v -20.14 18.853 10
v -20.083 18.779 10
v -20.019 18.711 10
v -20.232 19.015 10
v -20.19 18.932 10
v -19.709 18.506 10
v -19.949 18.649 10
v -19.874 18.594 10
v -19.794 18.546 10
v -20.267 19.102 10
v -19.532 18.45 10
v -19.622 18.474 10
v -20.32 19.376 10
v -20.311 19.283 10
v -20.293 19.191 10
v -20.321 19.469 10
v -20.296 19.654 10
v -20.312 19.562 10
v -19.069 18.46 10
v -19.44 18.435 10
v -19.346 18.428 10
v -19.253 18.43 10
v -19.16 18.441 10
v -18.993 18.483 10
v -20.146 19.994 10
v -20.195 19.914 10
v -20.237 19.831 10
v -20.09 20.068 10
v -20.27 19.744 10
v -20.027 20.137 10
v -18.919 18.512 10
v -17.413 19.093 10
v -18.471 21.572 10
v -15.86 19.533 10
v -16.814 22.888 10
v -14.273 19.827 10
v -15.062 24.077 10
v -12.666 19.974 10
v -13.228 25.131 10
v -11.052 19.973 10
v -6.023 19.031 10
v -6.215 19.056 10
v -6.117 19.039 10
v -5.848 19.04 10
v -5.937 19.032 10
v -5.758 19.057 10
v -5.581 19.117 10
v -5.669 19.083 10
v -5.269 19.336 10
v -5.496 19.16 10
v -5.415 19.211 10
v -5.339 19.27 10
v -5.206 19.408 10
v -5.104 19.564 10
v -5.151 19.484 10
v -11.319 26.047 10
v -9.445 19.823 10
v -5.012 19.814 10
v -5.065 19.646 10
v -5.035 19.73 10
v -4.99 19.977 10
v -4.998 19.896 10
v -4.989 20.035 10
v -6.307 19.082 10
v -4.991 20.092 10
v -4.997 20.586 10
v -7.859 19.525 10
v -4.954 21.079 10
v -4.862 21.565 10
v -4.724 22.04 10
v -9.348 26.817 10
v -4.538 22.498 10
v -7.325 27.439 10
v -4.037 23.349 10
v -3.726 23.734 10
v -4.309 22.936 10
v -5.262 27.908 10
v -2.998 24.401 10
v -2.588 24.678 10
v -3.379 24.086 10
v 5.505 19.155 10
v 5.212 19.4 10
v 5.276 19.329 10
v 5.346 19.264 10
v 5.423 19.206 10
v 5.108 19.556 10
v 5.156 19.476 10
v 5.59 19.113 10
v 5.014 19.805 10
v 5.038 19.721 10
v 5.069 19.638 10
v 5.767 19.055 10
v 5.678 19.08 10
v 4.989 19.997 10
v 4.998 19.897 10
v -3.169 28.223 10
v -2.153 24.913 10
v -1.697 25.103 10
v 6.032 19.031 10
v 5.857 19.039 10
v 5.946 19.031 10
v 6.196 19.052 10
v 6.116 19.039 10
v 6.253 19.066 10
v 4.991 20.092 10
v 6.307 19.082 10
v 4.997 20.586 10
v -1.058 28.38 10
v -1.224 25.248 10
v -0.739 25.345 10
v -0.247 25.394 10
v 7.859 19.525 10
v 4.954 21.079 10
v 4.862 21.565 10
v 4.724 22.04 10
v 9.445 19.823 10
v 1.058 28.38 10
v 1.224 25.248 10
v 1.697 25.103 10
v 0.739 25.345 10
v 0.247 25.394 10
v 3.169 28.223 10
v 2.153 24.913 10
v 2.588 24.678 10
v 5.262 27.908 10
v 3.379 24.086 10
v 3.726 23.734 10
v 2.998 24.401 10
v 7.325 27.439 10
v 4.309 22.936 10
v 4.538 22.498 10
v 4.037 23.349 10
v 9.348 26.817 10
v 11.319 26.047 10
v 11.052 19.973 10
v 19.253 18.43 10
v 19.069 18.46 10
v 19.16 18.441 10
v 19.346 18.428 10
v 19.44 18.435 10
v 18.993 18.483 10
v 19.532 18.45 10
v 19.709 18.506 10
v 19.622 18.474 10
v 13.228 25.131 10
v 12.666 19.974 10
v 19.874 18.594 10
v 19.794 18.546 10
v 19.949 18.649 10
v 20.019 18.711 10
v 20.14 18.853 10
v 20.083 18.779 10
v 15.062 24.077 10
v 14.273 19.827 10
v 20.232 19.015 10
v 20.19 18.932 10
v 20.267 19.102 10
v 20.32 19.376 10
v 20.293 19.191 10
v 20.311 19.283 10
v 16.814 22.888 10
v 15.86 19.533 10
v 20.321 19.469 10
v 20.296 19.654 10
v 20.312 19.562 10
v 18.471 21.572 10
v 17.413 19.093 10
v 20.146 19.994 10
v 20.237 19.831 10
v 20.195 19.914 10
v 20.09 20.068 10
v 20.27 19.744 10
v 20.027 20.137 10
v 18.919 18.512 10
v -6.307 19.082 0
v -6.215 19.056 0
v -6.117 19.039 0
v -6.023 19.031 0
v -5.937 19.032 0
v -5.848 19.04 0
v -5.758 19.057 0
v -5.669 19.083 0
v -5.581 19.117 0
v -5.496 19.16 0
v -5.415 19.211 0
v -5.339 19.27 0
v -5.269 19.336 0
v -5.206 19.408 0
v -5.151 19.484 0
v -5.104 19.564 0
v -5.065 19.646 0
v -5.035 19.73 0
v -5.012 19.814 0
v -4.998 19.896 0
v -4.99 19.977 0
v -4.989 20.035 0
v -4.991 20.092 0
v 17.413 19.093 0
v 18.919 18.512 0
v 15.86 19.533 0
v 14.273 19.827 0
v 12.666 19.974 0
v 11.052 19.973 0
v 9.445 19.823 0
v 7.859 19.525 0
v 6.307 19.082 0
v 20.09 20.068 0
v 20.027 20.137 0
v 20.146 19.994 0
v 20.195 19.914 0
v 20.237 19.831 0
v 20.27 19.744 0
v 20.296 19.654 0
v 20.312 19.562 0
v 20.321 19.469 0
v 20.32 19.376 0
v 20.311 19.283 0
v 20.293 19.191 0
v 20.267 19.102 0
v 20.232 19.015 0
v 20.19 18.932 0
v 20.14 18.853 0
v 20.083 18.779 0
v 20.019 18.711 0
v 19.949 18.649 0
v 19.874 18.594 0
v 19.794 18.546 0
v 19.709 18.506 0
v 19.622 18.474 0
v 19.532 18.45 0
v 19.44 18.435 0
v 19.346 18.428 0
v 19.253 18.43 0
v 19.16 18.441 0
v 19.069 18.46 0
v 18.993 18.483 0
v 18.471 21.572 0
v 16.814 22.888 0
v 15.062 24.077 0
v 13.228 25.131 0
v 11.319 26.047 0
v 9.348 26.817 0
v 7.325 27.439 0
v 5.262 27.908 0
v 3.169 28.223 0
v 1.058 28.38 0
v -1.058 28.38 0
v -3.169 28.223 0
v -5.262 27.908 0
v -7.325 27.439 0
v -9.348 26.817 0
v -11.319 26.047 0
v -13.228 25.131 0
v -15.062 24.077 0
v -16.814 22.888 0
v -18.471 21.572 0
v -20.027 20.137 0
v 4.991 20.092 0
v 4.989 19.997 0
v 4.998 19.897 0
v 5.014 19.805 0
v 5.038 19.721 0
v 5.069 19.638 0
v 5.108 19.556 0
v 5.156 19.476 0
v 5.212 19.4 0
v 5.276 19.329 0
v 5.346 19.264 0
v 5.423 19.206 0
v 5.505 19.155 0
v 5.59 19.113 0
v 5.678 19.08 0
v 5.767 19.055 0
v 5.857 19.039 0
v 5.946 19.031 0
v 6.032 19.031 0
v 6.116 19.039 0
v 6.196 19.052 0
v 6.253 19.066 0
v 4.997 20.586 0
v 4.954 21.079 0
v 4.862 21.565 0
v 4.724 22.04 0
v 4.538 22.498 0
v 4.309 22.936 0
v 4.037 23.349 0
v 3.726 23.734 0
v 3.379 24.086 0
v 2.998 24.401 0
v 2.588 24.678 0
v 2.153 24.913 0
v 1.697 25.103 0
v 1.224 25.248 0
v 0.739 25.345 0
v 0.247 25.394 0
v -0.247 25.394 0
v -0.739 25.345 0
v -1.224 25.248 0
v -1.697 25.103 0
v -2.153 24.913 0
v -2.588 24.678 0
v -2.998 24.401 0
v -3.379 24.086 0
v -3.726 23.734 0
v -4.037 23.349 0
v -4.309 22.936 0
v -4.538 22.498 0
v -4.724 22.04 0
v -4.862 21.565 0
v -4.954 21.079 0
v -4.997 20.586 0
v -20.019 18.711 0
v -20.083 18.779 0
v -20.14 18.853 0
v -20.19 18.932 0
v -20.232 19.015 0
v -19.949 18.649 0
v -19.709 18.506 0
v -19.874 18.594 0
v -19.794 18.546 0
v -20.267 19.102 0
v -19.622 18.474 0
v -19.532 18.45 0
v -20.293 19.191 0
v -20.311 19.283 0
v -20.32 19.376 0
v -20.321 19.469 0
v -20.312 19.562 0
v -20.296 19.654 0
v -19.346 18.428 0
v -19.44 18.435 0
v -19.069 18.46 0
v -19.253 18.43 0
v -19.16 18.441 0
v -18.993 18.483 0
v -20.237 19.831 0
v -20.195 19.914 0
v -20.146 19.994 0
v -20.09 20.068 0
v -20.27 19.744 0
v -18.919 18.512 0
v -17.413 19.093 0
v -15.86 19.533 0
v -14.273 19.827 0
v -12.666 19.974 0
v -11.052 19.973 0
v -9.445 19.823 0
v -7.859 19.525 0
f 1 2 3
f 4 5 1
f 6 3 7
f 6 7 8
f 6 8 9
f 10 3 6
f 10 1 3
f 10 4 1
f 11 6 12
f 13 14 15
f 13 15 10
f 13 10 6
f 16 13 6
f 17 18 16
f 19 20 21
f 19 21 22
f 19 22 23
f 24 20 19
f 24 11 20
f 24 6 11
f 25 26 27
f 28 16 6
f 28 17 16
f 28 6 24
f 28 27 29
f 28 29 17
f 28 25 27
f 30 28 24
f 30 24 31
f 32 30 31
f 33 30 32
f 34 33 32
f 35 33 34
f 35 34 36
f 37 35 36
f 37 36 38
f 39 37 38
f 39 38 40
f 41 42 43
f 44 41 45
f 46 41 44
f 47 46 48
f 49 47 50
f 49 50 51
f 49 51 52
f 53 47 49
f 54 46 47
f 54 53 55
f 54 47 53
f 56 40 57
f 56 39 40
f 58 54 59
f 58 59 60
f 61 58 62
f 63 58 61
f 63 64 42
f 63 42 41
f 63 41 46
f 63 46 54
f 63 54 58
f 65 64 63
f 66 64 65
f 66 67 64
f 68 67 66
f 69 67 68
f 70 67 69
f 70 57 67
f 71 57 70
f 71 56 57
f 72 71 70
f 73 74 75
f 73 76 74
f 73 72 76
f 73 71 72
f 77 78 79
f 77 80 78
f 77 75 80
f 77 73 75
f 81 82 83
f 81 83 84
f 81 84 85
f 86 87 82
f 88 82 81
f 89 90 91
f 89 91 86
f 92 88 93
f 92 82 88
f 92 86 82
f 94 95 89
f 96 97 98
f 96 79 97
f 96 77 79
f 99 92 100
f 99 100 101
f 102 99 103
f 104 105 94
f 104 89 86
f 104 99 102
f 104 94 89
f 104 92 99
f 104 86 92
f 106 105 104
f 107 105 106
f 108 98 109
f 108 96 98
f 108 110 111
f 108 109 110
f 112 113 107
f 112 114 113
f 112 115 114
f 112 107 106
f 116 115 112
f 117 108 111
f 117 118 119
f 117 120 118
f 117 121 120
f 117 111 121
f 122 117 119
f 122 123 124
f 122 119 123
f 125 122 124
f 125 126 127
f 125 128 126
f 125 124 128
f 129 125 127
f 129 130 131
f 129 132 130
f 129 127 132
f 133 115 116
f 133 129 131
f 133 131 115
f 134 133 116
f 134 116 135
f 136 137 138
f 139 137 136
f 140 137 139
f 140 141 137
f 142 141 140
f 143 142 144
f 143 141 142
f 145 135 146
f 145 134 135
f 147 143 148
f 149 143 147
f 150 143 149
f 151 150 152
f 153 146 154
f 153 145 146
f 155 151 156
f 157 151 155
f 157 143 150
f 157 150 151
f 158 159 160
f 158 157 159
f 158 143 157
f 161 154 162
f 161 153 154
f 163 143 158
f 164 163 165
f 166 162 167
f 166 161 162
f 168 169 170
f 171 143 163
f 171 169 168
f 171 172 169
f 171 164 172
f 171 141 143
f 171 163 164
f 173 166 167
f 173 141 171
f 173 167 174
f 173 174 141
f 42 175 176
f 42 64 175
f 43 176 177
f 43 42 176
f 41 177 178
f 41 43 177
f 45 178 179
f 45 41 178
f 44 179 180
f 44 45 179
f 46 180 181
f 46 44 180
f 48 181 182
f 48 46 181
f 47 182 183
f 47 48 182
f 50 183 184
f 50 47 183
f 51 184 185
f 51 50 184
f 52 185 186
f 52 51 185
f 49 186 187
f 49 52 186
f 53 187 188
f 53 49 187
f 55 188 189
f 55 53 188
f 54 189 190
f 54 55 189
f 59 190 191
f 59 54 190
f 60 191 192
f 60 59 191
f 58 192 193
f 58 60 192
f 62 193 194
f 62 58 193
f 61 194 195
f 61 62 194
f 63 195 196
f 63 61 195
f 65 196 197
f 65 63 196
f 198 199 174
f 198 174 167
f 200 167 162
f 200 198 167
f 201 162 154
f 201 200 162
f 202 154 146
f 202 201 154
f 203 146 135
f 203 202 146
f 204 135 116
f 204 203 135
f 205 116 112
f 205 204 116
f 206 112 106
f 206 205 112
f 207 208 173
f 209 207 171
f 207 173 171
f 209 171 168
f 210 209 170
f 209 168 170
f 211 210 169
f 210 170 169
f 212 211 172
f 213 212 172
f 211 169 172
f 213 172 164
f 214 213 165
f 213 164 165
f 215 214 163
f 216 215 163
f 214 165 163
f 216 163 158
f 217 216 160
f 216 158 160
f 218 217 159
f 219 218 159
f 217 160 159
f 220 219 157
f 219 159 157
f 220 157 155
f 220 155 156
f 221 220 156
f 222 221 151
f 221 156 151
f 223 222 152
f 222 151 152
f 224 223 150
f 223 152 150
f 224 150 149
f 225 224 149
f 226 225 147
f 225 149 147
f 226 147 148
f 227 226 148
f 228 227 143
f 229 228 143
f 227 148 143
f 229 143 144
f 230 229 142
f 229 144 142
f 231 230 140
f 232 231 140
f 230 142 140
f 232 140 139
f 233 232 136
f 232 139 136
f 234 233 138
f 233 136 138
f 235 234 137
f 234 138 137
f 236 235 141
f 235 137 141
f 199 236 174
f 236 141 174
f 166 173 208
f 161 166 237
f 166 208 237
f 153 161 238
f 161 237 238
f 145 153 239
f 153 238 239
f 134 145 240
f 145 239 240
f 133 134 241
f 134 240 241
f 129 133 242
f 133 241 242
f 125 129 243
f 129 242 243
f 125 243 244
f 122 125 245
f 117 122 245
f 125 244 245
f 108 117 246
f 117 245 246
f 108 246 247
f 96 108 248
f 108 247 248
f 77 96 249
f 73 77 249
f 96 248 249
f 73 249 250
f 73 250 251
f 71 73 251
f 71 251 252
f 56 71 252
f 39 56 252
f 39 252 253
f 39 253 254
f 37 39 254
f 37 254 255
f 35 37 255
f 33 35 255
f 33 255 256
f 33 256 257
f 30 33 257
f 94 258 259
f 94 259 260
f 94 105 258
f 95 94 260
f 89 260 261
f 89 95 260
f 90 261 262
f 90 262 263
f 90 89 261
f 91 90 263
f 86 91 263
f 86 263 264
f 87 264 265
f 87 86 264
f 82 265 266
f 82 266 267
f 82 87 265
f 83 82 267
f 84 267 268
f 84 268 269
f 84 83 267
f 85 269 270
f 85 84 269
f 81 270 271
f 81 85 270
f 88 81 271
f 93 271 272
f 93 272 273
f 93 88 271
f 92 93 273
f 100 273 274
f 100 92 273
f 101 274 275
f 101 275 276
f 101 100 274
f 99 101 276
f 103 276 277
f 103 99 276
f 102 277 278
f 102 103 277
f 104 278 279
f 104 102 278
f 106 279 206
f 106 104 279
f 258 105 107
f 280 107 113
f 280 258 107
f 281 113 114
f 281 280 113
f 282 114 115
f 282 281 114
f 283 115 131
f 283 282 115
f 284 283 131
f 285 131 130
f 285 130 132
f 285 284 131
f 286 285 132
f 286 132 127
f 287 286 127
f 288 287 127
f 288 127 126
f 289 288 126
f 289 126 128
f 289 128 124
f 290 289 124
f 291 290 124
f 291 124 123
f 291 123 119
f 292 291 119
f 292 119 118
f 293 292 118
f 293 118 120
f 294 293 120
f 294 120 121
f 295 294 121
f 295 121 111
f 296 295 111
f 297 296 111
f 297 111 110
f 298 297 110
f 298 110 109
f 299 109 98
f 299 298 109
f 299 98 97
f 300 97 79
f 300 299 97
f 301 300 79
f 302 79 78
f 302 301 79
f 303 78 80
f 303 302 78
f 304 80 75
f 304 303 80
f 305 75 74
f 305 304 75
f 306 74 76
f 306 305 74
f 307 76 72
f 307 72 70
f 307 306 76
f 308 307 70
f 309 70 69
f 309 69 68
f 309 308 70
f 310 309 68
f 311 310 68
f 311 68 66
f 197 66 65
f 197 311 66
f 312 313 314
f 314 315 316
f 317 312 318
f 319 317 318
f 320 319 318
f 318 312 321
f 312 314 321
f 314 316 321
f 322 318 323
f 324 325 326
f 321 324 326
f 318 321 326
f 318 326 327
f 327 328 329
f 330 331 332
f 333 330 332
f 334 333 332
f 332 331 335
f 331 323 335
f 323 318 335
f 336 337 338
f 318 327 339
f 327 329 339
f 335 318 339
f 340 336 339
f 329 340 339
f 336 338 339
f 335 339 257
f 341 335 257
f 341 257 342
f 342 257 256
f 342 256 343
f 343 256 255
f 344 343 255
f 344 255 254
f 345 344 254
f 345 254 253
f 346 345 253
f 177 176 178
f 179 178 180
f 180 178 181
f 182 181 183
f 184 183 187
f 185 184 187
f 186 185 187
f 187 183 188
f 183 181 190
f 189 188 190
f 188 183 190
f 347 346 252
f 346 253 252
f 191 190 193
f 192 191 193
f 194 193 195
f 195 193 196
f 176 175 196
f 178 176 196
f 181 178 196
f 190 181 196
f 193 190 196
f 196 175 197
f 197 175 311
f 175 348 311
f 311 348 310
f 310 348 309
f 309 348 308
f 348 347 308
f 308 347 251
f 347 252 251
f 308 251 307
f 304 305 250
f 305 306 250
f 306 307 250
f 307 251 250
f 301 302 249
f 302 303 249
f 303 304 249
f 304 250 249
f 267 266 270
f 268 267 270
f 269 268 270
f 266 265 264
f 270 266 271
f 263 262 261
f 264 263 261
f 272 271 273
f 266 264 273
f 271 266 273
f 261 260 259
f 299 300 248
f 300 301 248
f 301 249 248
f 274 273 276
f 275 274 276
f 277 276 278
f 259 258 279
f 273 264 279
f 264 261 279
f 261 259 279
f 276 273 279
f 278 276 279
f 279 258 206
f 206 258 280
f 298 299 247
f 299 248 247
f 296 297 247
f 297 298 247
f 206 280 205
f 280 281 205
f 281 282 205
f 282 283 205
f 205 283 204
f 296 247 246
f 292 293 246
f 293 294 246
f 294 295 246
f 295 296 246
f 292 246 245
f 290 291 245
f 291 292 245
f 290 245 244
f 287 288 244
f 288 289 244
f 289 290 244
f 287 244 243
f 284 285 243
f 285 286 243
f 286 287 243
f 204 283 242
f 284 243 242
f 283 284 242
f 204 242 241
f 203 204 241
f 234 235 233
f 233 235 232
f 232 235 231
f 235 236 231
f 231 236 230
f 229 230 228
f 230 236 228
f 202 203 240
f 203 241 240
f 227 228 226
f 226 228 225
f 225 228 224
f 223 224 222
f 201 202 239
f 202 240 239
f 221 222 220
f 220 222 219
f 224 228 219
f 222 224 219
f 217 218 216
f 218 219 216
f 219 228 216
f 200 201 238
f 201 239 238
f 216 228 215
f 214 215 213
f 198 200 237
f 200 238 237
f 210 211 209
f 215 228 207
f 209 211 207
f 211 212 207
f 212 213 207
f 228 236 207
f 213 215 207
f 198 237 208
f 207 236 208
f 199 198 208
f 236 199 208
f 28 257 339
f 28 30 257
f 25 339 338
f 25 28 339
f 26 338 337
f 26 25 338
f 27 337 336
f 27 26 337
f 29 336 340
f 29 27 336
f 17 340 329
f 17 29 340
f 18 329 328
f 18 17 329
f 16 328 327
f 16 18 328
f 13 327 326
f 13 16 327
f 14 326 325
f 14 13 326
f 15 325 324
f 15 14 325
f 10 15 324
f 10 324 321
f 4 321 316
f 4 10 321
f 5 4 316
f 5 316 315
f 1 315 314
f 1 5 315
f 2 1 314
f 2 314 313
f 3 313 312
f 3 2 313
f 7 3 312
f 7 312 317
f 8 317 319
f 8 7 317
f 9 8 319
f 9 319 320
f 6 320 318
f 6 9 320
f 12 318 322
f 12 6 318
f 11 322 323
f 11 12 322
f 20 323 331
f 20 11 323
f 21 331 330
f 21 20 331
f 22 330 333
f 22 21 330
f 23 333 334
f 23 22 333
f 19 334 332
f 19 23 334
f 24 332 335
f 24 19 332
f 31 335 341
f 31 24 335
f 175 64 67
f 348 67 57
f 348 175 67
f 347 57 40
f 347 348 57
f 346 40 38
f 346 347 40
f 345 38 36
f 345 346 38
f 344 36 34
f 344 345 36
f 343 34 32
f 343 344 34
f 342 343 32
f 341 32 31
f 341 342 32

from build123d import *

# Parameters (mm, degrees)
PAD_DEPTH = 10
FILLET_R  = 1


with BuildPart() as part:
    # Sketch → Pad (new body)
    with BuildSketch(Plane.XY):
        with BuildLine():
            ThreePointArc((24.115555, 15), (0, 28.4), (-24.115555, 15))
            ThreePointArc((-4.582576, 18.4), (-14.877009, 19.733033), (-24.115555, 15))
            ThreePointArc((4.582576, 18.4), (0, 25.4), (-4.582576, 18.4))
            ThreePointArc((24.115555, 15), (14.877009, 19.733033), (4.582576, 18.4))
        make_face()
    extrude(amount=PAD_DEPTH)

    # Fillet
    fillet_edges = [part.edges().sort_by_distance(p)[0] for p in [
        (-24.115555, 15, 5),
        (-4.582576, 18.4, 5),
        (4.582576, 18.4, 5),
        (24.115555, 15, 5),
    ]]
    fillet(fillet_edges, radius=FILLET_R)


solid = part.part
